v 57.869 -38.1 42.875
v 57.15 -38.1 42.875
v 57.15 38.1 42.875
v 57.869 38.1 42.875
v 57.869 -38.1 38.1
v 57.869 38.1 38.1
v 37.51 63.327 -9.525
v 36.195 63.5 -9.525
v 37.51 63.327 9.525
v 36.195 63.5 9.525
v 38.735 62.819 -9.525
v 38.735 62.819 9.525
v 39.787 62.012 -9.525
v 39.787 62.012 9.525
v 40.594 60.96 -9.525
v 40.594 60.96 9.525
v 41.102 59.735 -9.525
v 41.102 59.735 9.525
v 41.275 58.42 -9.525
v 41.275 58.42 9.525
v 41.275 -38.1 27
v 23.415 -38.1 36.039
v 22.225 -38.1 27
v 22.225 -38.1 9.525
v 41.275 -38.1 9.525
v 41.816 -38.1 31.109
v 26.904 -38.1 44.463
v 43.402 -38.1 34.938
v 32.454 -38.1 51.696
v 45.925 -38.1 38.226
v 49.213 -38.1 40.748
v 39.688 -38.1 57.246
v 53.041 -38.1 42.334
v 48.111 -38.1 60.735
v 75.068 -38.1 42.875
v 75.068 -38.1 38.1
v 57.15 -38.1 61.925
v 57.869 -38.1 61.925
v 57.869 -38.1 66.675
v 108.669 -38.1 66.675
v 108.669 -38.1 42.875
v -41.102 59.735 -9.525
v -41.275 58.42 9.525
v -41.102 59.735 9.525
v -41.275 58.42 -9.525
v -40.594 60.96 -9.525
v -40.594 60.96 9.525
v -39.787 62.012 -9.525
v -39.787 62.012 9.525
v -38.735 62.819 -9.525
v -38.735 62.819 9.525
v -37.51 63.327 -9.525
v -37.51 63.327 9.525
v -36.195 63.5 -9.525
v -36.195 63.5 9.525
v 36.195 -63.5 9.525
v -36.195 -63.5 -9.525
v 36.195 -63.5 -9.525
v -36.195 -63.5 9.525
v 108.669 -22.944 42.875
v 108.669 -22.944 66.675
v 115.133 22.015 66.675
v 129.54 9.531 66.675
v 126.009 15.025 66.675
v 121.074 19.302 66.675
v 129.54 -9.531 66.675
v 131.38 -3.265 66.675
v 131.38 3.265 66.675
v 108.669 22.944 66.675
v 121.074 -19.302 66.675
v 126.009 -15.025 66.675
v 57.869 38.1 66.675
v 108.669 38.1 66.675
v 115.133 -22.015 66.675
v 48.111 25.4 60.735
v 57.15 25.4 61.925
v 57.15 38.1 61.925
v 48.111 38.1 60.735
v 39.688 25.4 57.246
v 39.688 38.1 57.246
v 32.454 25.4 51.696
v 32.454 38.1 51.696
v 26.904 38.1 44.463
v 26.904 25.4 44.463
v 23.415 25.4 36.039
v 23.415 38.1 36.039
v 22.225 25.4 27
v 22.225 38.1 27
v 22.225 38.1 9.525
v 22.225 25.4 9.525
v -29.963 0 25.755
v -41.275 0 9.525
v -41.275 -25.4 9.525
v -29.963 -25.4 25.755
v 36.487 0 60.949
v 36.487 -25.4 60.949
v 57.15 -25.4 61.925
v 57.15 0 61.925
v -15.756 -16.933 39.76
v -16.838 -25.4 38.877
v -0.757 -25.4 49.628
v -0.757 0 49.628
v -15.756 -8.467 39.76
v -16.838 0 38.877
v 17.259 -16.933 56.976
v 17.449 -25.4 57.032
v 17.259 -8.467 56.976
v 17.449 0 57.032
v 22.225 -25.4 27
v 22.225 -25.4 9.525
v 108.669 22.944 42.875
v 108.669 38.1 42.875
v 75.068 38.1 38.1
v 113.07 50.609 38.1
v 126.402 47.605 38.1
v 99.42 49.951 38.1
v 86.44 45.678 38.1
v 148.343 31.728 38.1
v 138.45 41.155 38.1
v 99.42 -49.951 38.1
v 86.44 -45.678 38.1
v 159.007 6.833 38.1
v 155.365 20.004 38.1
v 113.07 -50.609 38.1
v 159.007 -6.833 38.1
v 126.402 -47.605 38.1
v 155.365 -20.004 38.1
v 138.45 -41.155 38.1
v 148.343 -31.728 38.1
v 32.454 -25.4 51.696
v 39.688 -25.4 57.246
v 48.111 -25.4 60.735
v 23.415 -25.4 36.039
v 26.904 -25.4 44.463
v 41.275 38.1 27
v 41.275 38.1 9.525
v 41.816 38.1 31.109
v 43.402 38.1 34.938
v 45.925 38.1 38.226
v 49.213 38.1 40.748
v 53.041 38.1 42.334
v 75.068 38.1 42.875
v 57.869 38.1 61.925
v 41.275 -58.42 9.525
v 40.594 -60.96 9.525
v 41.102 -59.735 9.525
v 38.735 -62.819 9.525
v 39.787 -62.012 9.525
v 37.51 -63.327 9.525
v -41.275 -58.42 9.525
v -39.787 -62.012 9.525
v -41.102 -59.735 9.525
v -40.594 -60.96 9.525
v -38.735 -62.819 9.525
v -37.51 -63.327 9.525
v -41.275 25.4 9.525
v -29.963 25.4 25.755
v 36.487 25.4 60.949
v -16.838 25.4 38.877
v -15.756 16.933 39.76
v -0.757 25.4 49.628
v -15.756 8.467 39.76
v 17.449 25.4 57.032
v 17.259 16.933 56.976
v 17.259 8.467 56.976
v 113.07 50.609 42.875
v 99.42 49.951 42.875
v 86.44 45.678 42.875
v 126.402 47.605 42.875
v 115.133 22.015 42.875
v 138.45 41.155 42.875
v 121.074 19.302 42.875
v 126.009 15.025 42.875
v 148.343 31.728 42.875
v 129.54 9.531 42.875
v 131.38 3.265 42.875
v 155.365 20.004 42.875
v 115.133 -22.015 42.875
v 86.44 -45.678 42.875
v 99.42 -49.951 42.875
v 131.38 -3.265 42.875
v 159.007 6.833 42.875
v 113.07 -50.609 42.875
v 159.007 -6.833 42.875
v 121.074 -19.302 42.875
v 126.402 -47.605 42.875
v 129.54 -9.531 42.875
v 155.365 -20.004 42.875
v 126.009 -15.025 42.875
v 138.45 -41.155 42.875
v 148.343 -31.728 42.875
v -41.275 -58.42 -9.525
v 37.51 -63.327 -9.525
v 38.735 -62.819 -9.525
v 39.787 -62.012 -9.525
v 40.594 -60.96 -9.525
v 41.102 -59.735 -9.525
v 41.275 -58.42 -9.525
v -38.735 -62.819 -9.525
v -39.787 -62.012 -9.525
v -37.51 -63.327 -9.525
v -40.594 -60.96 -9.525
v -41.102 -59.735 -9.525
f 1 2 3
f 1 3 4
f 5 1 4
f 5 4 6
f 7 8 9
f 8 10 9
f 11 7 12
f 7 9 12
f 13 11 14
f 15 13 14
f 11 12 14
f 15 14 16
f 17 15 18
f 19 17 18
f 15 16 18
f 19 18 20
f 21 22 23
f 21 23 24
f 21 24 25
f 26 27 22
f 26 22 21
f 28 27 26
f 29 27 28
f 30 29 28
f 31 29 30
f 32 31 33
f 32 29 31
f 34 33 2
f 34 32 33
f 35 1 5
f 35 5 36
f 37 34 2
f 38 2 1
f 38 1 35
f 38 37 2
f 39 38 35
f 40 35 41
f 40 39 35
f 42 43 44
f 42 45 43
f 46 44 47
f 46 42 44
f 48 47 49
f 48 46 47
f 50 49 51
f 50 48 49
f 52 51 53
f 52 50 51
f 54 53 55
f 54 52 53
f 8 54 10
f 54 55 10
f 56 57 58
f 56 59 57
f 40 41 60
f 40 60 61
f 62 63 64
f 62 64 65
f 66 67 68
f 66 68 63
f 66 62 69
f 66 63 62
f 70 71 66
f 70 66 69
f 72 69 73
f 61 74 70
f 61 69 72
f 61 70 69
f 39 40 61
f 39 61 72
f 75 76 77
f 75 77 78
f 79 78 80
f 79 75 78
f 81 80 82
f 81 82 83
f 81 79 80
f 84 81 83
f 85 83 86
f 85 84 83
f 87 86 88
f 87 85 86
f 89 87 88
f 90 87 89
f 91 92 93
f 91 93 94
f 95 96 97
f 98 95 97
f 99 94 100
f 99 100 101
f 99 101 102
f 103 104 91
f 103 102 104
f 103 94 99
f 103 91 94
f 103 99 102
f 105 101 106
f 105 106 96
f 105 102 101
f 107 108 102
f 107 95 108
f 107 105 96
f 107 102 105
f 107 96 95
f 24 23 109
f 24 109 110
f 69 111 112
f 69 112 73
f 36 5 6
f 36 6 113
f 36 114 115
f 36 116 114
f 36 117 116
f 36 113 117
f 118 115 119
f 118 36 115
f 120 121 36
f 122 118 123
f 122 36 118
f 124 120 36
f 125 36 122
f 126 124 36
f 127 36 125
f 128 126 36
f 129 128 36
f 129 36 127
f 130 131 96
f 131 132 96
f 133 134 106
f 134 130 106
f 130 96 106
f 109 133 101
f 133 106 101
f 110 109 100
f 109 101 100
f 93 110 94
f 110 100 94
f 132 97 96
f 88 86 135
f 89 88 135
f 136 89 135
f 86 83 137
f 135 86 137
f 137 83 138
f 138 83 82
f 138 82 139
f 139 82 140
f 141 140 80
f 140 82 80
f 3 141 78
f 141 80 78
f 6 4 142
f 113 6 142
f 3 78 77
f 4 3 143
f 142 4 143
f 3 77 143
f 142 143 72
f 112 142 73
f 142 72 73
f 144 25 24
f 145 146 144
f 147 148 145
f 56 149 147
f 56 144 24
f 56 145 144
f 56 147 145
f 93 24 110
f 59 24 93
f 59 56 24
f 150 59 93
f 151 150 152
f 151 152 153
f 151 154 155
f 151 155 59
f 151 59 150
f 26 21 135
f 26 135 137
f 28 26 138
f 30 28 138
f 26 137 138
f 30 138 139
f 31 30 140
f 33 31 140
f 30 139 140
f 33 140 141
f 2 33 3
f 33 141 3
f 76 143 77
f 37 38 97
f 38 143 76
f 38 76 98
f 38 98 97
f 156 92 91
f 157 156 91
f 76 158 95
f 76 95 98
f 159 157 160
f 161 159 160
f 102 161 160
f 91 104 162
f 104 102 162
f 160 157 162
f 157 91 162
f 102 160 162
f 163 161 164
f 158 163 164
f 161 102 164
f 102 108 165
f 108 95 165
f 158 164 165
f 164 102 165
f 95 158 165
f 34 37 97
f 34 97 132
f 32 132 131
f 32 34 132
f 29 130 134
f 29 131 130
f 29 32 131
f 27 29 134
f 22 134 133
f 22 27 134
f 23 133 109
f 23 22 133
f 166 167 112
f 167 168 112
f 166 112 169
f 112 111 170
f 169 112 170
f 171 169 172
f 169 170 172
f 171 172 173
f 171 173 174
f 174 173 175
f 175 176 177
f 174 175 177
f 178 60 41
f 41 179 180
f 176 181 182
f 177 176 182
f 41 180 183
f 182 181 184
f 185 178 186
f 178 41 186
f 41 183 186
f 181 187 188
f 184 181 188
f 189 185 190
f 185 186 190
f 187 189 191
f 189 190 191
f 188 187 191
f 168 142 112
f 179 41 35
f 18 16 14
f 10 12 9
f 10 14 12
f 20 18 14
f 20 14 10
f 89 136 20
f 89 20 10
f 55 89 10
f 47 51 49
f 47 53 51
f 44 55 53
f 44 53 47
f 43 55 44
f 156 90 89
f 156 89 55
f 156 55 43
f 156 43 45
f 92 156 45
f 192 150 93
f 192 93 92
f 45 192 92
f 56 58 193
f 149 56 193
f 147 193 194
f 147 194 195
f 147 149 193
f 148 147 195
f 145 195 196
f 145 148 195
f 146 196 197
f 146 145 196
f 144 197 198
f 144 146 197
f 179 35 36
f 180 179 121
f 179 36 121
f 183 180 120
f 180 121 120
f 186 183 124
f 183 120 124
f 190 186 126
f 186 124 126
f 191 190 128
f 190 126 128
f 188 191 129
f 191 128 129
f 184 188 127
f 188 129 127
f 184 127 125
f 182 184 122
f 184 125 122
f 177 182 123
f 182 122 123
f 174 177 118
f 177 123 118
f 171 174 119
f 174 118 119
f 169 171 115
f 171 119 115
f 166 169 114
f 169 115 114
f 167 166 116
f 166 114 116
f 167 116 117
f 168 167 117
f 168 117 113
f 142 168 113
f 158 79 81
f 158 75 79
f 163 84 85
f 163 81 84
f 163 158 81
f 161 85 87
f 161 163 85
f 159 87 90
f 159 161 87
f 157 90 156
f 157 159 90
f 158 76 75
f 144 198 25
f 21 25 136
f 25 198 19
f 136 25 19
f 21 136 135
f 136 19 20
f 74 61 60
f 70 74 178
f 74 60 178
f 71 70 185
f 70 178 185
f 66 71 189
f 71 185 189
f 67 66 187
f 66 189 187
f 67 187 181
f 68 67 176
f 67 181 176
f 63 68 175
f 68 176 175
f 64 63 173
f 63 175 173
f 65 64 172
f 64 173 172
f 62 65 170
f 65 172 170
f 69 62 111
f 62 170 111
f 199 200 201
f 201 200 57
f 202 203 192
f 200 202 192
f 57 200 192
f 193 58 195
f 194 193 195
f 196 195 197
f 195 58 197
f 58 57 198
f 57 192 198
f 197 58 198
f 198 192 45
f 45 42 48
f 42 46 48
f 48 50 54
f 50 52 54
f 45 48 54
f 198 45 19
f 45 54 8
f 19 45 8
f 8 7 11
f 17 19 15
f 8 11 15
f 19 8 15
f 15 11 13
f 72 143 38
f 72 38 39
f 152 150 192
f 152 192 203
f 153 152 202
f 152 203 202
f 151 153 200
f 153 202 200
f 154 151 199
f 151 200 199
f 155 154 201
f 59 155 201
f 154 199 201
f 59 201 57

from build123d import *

# Parameters (mm, degrees)
F1_DEPTH = 63.5
F2_DEPTH = 25.4
F0_W     = 27.8559744183
F0_H     = 4.7498
F0_H_2   = 19.05
F3_DEPTH = 38.1
F4_DEPTH = 25.4
F6_R     = 5.08


with BuildPart() as f1:
    # F0 (on Front) → F1 (new body, symmetric)
    with BuildSketch(Plane.XZ):
        Polygon((-41.275, 9.525), (-41.275, -9.525), (41.275, -9.525), (41.275, 9.525), (22.225, 9.525), align=None)
    extrude(amount=F1_DEPTH, both=True)

    # F0 (on Front) → F2 (join, symmetric)
    with BuildSketch(Plane.XZ):
        with BuildLine():
            add(Edge.make_bspline(
                [(-41.275, 9.525), (-19.7094231844, 46.5213470161), (14.027427882, 62.8570914268), (57.15, 61.9252)],
                knots=[0, 0, 0, 0, 111.5045361635, 111.5045361635, 111.5045361635, 111.5045361635], degree=3))
            Line((-41.275, 9.525), (22.225, 9.525))
            Line((22.225, 9.525), (22.225, 27.0002))
            ThreePointArc((22.225, 27.0002), (32.4542956671, 51.6959043329), (57.15, 61.9252))
        make_face()
    extrude(amount=F2_DEPTH, both=True)

    # F0 (on Front) → F3 (join, symmetric)
    with BuildSketch(Plane.XZ):
        Polygon((85.725, 42.8752), (57.8690255817, 42.8752), (57.8690255817, 38.1), (108.6690255817, 38.1), (108.6690255817, 66.675), (85.725, 66.675), (85.725, 61.9252), align=None)
        with BuildLine():
            Line((22.225, 9.525), (41.275, 9.525))
            Line((41.275, 9.525), (41.275, 27.0002))
            ThreePointArc((41.275, 27.0002), (45.9246798487, 38.2255201513), (57.15, 42.8752))
            Line((57.15, 42.8752), (57.8690255817, 42.8752))
            Line((57.8690255817, 42.8752), (57.8690255817, 61.9252))
            Line((57.8690255817, 61.9252), (57.15, 61.9252))
            ThreePointArc((57.15, 61.9252), (32.4542956671, 51.6959043329), (22.225, 27.0002))
            Line((22.225, 27.0002), (22.225, 9.525))
        make_face()
        with Locations((71.7970127909, 64.3001)):
            Rectangle(F0_W, F0_H)
        with Locations((71.7970127909, 52.4002)):
            Rectangle(F0_W, F0_H_2)
    extrude(amount=F3_DEPTH, both=True)

    # F0 (on Front) → F4 (join)
    with BuildSketch(Plane.XZ):
        Polygon((-41.275, 9.525), (-41.275, -9.525), (41.275, -9.525), (41.275, 9.525), (22.225, 9.525), align=None)
        with BuildLine():
            add(Edge.make_bspline(
                [(-41.275, 9.525), (-19.7094231844, 46.5213470161), (14.027427882, 62.8570914268), (57.15, 61.9252)],
                knots=[0, 0, 0, 0, 111.5045361635, 111.5045361635, 111.5045361635, 111.5045361635], degree=3))
            Line((-41.275, 9.525), (22.225, 9.525))
            Line((22.225, 9.525), (22.225, 27.0002))
            ThreePointArc((22.225, 27.0002), (32.4542956671, 51.6959043329), (57.15, 61.9252))
        make_face()
        with BuildLine():
            Line((22.225, 9.525), (41.275, 9.525))
            Line((41.275, 9.525), (41.275, 27.0002))
            ThreePointArc((41.275, 27.0002), (45.9246798487, 38.2255201513), (57.15, 42.8752))
            Line((57.15, 42.8752), (57.8690255817, 42.8752))
            Line((57.8690255817, 42.8752), (57.8690255817, 61.9252))
            Line((57.8690255817, 61.9252), (57.15, 61.9252))
            ThreePointArc((57.15, 61.9252), (32.4542956671, 51.6959043329), (22.225, 27.0002))
            Line((22.225, 27.0002), (22.225, 9.525))
        make_face()
        with Locations((71.7970127909, 52.4002)):
            Rectangle(F0_W, F0_H_2)
        with Locations((71.7970127909, 64.3001)):
            Rectangle(F0_W, F0_H)
        Polygon((85.725, 42.8752), (57.8690255817, 42.8752), (57.8690255817, 38.1), (108.6690255817, 38.1), (108.6690255817, 66.675), (85.725, 66.675), (85.725, 61.9252), align=None)
    extrude(amount=F4_DEPTH)

    # F0 (on Front) → F5 (revolve)
    with BuildSketch(Plane.XZ):
        Polygon((85.725, 42.8752), (57.8690255817, 42.8752), (57.8690255817, 38.1), (108.6690255817, 38.1), (108.6690255817, 66.675), (85.725, 66.675), (85.725, 61.9252), align=None)
    revolve(axis=Axis((108.6690255817, 0, 52.3875), (0, 0, 1)))

    # F6
    f6_edges = [f1.edges().sort_by_distance(p)[0] for p in [
        (-41.275, 63.5, 0),
        (41.275, 63.5, 0),
        (-41.275, -63.5, 0),
        (41.275, -63.5, 0),
    ]]
    fillet(f6_edges, radius=F6_R)


solid = f1.part
